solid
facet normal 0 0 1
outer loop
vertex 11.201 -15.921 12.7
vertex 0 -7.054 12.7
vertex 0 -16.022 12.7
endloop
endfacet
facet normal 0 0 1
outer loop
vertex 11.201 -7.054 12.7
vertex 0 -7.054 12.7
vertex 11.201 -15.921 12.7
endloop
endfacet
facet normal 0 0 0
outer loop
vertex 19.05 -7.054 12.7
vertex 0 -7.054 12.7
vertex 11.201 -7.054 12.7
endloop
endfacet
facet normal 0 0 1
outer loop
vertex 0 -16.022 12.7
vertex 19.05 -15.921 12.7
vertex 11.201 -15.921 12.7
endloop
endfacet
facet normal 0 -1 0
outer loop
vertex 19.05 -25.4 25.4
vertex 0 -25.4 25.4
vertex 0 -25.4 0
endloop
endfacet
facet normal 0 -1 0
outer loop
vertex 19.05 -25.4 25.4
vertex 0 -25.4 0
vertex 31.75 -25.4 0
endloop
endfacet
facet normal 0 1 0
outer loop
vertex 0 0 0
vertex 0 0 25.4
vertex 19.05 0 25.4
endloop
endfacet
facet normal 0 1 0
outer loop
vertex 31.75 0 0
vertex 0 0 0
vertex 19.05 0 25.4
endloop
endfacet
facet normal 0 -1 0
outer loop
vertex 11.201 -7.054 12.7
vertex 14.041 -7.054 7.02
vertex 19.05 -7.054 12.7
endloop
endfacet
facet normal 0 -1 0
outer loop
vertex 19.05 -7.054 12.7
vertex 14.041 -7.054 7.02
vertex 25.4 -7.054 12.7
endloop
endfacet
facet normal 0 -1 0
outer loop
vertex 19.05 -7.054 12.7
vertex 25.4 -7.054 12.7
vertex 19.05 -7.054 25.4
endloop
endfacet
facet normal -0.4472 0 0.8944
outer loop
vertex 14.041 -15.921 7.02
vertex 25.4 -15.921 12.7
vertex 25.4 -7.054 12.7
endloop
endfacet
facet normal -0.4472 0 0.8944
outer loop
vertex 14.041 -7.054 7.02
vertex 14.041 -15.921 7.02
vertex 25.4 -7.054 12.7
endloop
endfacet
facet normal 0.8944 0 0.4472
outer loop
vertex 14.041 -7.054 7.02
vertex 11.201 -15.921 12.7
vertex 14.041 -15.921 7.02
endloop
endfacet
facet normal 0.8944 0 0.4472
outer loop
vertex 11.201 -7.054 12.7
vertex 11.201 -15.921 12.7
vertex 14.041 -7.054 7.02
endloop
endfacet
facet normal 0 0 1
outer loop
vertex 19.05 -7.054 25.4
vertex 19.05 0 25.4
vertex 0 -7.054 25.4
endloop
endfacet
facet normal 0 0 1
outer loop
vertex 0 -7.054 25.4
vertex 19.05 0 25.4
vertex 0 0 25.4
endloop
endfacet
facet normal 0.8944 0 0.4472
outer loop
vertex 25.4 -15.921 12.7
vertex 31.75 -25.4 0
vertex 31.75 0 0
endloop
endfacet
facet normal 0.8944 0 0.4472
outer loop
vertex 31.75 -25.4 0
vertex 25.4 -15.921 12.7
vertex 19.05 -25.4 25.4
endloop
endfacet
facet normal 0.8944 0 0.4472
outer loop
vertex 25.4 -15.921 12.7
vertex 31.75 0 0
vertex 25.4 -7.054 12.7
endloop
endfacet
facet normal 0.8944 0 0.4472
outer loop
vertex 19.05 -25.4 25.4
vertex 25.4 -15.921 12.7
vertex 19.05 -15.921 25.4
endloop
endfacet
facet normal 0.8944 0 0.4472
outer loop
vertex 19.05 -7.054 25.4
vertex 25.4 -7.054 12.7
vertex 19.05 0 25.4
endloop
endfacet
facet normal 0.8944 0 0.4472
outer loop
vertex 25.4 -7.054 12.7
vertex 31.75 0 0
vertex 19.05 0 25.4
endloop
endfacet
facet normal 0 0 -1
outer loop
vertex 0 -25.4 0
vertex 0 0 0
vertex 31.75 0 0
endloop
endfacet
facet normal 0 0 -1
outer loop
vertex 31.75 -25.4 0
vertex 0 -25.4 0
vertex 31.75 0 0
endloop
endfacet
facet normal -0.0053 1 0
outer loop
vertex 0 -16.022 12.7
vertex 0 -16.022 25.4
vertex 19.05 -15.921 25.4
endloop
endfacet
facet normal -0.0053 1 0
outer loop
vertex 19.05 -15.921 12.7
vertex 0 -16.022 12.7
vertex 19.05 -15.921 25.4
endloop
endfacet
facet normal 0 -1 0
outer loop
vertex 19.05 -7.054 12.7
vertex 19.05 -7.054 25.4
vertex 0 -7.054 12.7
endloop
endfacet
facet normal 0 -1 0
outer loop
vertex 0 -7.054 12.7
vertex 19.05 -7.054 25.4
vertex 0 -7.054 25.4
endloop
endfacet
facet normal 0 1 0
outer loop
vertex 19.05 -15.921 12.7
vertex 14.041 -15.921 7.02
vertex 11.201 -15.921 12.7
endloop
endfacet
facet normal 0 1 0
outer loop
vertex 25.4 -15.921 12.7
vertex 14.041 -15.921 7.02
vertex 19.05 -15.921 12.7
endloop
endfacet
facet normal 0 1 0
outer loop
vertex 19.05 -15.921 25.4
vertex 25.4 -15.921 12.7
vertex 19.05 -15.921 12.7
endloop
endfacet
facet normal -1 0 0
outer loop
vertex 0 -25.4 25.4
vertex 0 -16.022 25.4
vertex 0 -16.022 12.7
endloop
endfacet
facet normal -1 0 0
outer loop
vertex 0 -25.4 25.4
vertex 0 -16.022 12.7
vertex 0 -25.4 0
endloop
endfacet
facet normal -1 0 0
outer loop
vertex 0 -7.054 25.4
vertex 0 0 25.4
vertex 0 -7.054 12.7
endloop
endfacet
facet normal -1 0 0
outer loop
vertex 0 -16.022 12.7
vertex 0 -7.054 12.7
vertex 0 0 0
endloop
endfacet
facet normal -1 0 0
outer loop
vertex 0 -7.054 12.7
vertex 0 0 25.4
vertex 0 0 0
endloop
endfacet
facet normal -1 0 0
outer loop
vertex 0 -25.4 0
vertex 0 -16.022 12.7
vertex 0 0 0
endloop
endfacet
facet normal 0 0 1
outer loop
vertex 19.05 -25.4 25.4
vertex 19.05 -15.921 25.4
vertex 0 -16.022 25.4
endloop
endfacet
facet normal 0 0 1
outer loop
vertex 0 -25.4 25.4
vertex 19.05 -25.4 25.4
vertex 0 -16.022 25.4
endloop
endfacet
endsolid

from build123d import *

# Parameters (mm, degrees)
F1_DEPTH = 25.4
F2_W     = 8.867607
F2_H     = 14.199032
F3_DEPTH = 12.7
F5_DEPTH = 12.7


with BuildPart() as f1:
    # F0 (on Front) → F1 (new body)
    with BuildSketch(Plane.XZ):
        Polygon((0, 25.4), (0, 0), (31.75, 0), (19.05, 25.4), align=None)
    extrude(amount=F1_DEPTH)

    # F2 (on face) → F3 (cut, symmetric)
    with BuildSketch(Plane(origin=(25.4, 0, 12.7), x_dir=(0, 1, 0), z_dir=(0.894427, 0, 0.447214))):
        with Locations((-11.487583, 7.099516)):
            Rectangle(F2_W, F2_H)
    extrude(amount=F3_DEPTH, both=True, mode=Mode.SUBTRACT)

    # F4 (on face) → F5 (cut, symmetric)
    with BuildSketch(Plane.XY.offset(25.4)):
        Polygon((19.05, -15.921386), (19.05, -7.053779), (0, -7.053779), (0, -16.022153), align=None)
    extrude(amount=F5_DEPTH, both=True, mode=Mode.SUBTRACT)


solid = f1.part
